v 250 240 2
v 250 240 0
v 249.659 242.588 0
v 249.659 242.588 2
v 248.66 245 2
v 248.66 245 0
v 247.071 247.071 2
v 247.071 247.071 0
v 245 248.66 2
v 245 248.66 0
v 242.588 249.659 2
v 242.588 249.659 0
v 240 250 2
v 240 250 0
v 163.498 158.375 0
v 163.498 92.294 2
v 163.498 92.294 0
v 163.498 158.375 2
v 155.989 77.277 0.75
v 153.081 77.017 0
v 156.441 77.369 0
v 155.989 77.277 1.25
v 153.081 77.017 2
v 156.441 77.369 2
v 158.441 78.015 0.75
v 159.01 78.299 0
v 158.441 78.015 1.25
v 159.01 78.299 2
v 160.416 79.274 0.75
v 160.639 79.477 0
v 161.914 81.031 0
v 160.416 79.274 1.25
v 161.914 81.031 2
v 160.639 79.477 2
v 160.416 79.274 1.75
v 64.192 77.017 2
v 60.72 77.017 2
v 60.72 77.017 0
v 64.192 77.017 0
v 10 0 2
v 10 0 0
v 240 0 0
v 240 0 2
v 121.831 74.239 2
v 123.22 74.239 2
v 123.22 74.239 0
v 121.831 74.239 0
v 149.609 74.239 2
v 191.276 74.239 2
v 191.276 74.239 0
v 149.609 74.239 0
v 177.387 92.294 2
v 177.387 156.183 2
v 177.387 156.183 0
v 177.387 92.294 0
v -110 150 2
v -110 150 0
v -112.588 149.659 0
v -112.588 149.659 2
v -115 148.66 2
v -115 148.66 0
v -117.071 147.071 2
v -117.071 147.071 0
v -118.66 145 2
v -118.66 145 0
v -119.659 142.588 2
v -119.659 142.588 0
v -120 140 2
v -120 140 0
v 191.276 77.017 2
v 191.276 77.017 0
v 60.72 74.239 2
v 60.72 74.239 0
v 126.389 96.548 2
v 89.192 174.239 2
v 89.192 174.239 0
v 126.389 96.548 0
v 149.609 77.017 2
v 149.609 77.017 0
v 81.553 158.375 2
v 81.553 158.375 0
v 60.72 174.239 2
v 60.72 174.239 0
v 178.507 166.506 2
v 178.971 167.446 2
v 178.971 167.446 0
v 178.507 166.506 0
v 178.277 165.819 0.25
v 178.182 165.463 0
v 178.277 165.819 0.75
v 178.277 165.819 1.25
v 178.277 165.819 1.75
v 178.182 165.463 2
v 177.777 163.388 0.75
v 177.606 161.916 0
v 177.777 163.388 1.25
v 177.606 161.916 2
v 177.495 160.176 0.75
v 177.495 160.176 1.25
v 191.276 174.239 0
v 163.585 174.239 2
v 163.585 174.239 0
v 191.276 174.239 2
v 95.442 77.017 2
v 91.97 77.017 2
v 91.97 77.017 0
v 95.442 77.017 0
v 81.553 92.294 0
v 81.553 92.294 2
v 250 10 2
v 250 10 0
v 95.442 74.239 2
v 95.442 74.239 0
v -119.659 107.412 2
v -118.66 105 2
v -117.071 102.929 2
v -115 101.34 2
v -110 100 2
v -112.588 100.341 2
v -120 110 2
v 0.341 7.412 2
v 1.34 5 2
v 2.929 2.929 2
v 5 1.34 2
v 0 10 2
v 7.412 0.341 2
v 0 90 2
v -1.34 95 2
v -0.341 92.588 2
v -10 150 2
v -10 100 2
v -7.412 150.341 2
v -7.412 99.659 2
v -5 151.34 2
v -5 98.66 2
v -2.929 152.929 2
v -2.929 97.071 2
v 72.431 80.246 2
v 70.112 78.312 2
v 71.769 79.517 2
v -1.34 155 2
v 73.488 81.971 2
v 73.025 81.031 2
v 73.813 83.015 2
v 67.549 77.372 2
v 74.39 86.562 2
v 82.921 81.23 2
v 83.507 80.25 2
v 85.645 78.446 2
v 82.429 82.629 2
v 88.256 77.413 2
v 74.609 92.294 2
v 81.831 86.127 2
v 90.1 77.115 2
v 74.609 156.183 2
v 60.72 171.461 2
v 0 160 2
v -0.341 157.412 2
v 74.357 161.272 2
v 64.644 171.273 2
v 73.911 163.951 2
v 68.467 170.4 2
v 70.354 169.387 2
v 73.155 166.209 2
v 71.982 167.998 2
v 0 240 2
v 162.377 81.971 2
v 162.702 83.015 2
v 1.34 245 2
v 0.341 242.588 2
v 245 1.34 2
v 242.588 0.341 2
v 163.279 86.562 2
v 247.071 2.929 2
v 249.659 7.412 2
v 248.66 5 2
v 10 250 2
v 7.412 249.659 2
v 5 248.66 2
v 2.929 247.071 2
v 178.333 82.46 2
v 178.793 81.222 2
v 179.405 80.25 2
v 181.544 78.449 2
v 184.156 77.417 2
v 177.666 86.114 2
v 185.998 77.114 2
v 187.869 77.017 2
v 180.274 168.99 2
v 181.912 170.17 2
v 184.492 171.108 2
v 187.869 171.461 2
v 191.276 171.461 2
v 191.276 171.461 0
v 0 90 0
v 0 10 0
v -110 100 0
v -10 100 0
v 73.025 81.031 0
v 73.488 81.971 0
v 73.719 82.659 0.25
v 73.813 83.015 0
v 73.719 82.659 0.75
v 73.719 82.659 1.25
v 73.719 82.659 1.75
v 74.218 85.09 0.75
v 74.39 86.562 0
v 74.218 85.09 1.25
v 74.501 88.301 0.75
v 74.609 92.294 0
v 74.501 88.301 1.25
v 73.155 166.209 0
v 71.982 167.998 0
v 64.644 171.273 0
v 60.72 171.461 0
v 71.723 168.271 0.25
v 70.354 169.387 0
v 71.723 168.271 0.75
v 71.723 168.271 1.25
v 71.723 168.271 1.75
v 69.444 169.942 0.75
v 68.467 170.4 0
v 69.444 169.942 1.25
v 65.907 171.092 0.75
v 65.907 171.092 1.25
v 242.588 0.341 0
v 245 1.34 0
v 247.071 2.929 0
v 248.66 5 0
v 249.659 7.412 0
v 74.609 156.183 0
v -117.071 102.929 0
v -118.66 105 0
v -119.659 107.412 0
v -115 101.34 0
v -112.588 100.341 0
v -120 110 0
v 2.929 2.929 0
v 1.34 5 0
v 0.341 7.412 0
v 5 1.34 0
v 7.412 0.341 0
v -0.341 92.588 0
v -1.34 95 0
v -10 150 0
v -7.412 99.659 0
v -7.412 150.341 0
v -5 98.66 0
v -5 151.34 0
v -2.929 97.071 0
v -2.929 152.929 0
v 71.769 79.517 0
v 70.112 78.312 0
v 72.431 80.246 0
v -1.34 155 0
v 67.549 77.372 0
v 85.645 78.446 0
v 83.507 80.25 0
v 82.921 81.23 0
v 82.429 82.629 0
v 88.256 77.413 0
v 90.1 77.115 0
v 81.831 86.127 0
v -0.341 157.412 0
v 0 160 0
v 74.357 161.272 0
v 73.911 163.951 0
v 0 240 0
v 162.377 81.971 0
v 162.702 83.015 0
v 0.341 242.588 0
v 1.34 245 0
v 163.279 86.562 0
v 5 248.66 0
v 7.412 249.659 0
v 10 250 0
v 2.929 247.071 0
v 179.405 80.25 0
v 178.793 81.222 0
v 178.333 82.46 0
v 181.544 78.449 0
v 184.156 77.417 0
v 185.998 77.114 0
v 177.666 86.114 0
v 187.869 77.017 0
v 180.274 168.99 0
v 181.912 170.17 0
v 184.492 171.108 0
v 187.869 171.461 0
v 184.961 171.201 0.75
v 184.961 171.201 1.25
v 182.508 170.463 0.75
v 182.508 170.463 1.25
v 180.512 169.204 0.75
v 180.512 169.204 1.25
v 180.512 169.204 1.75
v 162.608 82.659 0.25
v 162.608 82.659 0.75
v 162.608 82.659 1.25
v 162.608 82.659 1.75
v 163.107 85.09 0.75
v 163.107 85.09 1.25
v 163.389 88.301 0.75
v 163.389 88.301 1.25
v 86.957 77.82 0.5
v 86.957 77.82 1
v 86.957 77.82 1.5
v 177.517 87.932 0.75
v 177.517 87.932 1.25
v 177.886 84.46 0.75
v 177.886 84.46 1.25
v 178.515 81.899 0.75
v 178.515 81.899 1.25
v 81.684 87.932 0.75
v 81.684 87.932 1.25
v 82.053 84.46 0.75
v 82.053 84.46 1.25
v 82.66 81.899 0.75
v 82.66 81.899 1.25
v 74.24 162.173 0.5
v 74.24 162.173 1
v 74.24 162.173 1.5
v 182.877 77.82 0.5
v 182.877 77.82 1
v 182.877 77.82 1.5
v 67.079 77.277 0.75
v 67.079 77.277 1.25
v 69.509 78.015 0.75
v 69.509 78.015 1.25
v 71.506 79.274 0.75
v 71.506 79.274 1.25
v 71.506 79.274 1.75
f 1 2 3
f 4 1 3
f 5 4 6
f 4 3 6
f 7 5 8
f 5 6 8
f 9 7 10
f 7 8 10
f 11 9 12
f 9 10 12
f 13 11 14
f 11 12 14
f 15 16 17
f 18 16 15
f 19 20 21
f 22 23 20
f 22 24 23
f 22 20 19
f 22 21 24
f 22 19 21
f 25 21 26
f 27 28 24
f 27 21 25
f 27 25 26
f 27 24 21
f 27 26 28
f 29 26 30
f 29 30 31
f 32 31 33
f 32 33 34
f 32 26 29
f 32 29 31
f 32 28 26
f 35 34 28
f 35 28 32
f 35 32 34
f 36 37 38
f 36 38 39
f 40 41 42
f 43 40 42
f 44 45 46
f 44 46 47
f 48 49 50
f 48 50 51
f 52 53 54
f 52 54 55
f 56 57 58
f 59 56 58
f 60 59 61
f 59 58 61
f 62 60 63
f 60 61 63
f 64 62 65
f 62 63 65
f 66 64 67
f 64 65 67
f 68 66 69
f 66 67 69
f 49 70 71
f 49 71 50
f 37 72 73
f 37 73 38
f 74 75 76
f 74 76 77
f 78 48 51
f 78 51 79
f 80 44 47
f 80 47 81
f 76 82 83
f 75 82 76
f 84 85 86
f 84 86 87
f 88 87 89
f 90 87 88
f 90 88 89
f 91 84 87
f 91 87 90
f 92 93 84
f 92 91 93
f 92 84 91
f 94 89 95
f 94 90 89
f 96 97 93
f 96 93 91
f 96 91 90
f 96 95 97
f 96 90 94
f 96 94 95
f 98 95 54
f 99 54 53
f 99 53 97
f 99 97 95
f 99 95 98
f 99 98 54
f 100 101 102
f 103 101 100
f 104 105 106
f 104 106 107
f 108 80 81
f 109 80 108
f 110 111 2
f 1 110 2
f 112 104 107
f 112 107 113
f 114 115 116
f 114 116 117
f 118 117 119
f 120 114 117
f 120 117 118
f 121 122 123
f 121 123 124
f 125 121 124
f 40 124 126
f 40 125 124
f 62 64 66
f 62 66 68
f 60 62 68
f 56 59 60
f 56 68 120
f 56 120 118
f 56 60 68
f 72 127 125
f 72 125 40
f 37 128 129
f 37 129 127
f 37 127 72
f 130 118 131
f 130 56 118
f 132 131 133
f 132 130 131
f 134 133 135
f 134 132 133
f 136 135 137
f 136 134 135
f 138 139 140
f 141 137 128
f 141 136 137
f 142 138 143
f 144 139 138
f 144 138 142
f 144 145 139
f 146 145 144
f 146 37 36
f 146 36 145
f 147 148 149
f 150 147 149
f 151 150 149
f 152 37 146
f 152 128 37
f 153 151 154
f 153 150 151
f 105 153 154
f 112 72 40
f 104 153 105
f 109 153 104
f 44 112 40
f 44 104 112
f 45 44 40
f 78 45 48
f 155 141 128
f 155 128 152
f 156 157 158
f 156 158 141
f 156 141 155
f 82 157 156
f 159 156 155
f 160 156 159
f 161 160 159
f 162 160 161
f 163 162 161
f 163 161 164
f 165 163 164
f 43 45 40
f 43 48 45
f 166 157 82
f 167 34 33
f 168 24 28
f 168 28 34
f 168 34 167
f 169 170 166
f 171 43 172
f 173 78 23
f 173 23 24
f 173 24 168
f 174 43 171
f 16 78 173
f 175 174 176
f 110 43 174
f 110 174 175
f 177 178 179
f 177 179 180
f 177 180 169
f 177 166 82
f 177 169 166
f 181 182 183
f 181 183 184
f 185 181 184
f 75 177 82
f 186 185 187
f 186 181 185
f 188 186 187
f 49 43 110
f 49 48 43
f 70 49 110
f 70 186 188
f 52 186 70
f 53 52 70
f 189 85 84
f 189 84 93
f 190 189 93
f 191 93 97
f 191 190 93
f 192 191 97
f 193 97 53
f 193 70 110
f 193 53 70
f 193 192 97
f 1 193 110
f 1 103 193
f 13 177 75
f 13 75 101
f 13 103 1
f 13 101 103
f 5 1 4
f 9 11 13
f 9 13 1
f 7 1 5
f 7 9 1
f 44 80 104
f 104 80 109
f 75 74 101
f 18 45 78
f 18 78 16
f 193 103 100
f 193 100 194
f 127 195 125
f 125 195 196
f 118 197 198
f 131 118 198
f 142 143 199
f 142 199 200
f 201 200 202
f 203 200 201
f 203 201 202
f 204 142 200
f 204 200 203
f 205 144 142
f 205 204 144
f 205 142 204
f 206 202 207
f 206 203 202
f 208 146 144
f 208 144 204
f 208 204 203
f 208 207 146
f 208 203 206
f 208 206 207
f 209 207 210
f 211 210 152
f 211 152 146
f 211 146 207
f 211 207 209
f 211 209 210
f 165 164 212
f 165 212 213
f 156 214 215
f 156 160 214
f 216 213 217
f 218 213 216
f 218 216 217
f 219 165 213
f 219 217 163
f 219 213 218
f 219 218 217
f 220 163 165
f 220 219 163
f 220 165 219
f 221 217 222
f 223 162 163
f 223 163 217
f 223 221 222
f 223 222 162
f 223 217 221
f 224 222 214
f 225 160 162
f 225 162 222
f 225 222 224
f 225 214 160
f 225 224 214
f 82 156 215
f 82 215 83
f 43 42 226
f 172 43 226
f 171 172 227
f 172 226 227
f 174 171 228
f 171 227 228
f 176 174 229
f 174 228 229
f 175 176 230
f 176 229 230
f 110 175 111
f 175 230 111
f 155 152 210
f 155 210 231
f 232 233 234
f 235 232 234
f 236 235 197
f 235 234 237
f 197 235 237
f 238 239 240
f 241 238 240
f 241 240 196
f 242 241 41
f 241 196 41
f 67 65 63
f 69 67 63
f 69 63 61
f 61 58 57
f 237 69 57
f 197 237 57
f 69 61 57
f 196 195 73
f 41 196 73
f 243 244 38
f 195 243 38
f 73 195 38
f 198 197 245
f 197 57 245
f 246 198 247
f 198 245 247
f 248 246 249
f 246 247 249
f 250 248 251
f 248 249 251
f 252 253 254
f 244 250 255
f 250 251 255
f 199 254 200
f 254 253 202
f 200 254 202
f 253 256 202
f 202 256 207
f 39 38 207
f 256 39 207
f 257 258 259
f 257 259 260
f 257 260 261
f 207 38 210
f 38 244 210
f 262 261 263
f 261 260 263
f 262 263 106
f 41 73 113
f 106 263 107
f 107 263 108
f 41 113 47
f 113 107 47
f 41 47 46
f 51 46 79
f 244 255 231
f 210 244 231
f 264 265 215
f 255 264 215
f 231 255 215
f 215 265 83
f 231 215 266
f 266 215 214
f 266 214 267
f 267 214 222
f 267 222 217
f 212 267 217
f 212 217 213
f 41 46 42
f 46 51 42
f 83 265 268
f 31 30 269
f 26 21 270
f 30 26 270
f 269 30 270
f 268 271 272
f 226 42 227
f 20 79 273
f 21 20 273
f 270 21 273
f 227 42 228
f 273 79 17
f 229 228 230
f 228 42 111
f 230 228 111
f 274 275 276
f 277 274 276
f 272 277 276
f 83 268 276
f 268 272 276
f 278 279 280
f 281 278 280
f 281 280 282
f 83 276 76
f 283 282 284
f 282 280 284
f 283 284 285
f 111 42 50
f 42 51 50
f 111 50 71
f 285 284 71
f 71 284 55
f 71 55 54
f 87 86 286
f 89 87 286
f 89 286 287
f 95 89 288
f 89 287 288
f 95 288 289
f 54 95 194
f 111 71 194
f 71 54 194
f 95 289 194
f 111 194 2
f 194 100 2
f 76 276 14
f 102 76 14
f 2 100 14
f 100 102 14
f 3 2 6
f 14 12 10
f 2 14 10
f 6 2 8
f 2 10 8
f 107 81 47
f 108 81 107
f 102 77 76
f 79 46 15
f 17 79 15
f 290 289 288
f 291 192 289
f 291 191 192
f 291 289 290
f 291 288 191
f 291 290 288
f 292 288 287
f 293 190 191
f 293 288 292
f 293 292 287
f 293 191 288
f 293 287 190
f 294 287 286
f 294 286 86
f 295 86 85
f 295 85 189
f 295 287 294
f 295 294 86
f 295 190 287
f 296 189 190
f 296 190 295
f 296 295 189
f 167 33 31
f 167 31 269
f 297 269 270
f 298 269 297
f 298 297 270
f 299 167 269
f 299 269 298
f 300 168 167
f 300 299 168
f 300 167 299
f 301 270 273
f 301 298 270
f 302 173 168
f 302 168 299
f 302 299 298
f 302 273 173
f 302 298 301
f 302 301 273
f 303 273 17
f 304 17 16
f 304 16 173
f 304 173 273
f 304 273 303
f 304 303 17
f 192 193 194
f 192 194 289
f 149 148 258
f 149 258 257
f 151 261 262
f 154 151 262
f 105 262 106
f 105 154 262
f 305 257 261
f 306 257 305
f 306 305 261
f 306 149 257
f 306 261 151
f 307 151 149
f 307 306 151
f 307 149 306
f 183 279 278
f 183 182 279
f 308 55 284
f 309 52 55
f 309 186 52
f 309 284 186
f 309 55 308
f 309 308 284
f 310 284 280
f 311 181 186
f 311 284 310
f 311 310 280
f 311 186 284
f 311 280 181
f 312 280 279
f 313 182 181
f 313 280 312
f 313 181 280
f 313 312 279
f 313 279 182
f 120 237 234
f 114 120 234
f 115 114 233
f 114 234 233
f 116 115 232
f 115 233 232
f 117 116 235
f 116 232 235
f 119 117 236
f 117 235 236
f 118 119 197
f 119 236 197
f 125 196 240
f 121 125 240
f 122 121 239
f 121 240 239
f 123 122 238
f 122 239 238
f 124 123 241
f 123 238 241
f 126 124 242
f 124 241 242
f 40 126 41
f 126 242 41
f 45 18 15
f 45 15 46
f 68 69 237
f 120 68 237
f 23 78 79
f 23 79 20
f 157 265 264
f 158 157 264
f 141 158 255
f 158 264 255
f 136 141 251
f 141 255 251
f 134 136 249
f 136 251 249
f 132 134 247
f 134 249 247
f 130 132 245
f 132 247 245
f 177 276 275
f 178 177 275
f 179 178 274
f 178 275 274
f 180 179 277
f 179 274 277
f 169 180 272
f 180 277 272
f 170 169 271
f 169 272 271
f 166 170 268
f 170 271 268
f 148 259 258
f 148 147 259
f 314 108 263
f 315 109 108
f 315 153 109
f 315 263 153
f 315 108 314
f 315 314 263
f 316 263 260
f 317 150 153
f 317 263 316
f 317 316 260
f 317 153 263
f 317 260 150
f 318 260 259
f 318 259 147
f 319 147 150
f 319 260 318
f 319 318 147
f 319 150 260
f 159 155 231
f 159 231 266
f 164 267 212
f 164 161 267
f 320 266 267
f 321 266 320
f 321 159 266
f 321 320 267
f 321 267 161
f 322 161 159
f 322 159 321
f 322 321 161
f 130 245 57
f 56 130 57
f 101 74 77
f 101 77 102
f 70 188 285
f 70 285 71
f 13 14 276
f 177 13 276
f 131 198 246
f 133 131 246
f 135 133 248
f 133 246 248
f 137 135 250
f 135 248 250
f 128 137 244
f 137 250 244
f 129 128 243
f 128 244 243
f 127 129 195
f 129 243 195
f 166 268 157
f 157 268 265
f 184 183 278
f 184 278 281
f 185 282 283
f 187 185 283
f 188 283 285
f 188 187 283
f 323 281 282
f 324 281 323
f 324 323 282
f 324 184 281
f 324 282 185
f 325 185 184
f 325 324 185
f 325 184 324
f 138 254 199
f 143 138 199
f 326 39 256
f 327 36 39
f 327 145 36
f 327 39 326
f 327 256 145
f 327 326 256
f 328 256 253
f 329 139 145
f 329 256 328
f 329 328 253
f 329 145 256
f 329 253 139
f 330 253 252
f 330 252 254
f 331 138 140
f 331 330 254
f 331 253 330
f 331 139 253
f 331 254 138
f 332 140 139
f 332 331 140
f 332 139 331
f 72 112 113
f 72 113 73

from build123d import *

# Parameters (mm, degrees)
BOSS_EXTRUDE1_DEPTH = 2
CUT_EXTRUDE1_DEPTH  = 2


with BuildPart() as part:
    # Sketch1 → Boss-Extrude1 (new body)
    with BuildSketch(Plane.XY):
        with BuildLine():
            Line((10, 0), (240, 0))
            ThreePointArc((240, 0), (247.071067812, 2.928932188), (250, 10))
            Line((250, 10), (250, 240))
            ThreePointArc((250, 240), (247.071067812, 247.071067812), (240, 250))
            Line((240, 250), (10, 250))
            ThreePointArc((10, 250), (2.928932188, 247.071067812), (0, 240))
            Line((0, 240), (0, 160))
            ThreePointArc((0, 160), (-2.928932188, 152.928932188), (-10, 150))
            Line((-10, 150), (-110, 150))
            ThreePointArc((-110, 150), (-117.071067812, 147.071067812), (-120, 140))
            Line((-120, 140), (-120, 110))
            ThreePointArc((-120, 110), (-117.071067812, 102.928932188), (-110, 100))
            Line((-110, 100), (-10, 100))
            ThreePointArc((-10, 100), (-2.928932188, 97.071067812), (0, 90))
            Line((0, 90), (0, 10))
            ThreePointArc((0, 10), (2.928932188, 2.928932188), (10, 0))
        make_face()
    extrude(amount=BOSS_EXTRUDE1_DEPTH)

    # Sketch2 → Cut-Extrude1 (cut)
    with BuildSketch(Plane.XY.offset(2)):
        with BuildLine():
            Line((121.831245853, 74.238883319), (81.553468075, 158.375168042))
            Line((81.553468075, 158.375168042), (81.553468075, 92.294438875))
            add(Edge.make_bspline(
                [(81.553468075, 92.294438875), (81.552441695, 91.527408259), (81.550494213, 90.07202371), (81.67476659, 88.003330285), (81.809557178, 86.154926562), (82.033410561, 84.535090304), (82.270961447, 83.126350994), (82.624899995, 81.963045824), (82.992758599, 80.996359886), (83.345604613, 80.48395593), (83.506593075, 80.250168042)],
                knots=[0, 0, 0, 0, 1.48973486, 2.826663046, 4.025252461, 5.088590954, 6.003687083, 6.795186099, 7.45029523, 8, 8, 8, 8], degree=3))
            add(Edge.make_bspline(
                [(83.506593075, 80.250168042), (83.997407371, 79.750770196), (84.996905643, 78.733792313), (87.003759394, 77.711270113), (89.366130367, 77.105906039), (91.068976257, 77.047545775), (91.970134742, 77.016661097)],
                knots=[0, 0, 0, 0, 0.893460505, 1.819450328, 2.846037184, 4, 4, 4, 4], degree=3))
            Line((91.970134742, 77.016661097), (95.442356964, 77.016661097))
            Line((95.442356964, 77.016661097), (95.442356964, 74.238883319))
            Line((95.442356964, 74.238883319), (60.720134742, 74.238883319))
            Line((60.720134742, 74.238883319), (60.720134742, 77.016661097))
            Line((60.720134742, 77.016661097), (64.192356964, 77.016661097))
            add(Edge.make_bspline(
                [(64.192356964, 77.016661097), (64.692336968, 77.027575423), (65.660187495, 77.048703141), (67.053155801, 77.255679207), (68.340072371, 77.542980734), (69.511077493, 77.990029314), (70.577284489, 78.54537262), (71.523997685, 79.246760067), (72.334604766, 80.088398233), (72.793088669, 80.714808629), (73.024822242, 81.031418042)],
                knots=[0, 0, 0, 0, 1.182386838, 2.288838982, 3.326958154, 4.296765023, 5.246416275, 6.164047556, 7.072046332, 8, 8, 8, 8], degree=3))
            add(Edge.make_bspline(
                [(73.024822242, 81.031418042), (73.154175481, 81.267158908), (73.438935547, 81.786122213), (73.754068555, 82.7087764), (73.999815936, 83.832477906), (74.243351558, 85.140425739), (74.413930293, 86.655788373), (74.502709761, 88.358707772), (74.607417007, 90.260571867), (74.608469203, 91.592574666), (74.609023631, 92.294438875)],
                knots=[0, 0, 0, 0, 0.561580455, 1.236271222, 2.028879402, 2.966584022, 4.017422664, 5.2149421, 6.532486222, 8, 8, 8, 8], degree=3))
            Line((74.609023631, 92.294438875), (74.609023631, 156.183327764))
            add(Edge.make_bspline(
                [(74.609023631, 156.183327764), (74.598097419, 157.262279808), (74.57781297, 159.265348068), (74.292147678, 162.020464101), (73.887395445, 164.316152629), (73.38248359, 165.621386735), (73.155030575, 166.20936943)],
                knots=[0, 0, 0, 0, 1.269100049, 2.356076937, 3.259444487, 4, 4, 4, 4], degree=3))
            add(Edge.make_bspline(
                [(73.155030575, 166.20936943), (72.964440038, 166.571330676), (72.572351095, 167.315968917), (71.739346077, 168.310495354), (70.678433406, 169.192456789), (69.404596857, 170.014029453), (67.793926343, 170.70426646), (65.790057774, 171.151821363), (63.389943364, 171.426827209), (61.654210729, 171.449112709), (60.720134742, 171.461105542)],
                knots=[0, 0, 0, 0, 0.685675889, 1.410594349, 2.160436148, 2.996293973, 3.94870651, 5.086176952, 6.431940446, 8, 8, 8, 8], degree=3))
            Line((60.720134742, 171.461105542), (60.720134742, 174.238883319))
            Line((60.720134742, 174.238883319), (89.192356964, 174.238883319))
            Line((89.192356964, 174.238883319), (126.38853752, 96.547911097))
            Line((126.38853752, 96.547911097), (163.584718075, 174.238883319))
            Line((163.584718075, 174.238883319), (191.275690297, 174.238883319))
            Line((191.275690297, 174.238883319), (191.275690297, 171.461105542))
            Line((191.275690297, 171.461105542), (187.868572242, 171.461105542))
            add(Edge.make_bspline(
                [(187.868572242, 171.461105542), (187.361287545, 171.450707073), (186.386065744, 171.430716694), (184.979607429, 171.218940655), (183.683652592, 170.938748781), (182.506844601, 170.48708074), (181.439074078, 169.933617837), (180.493564629, 169.223853404), (179.660586682, 168.397082941), (179.201520738, 167.764165368), (178.971002797, 167.446348597)],
                knots=[0, 0, 0, 0, 1.192663738, 2.292818382, 3.341598875, 4.305885976, 5.250132179, 6.162540657, 7.077327887, 8, 8, 8, 8], degree=3))
            add(Edge.make_bspline(
                [(178.971002797, 167.446348597), (178.841649558, 167.210607731), (178.556889492, 166.691644426), (178.241756484, 165.768990238), (177.996009103, 164.645288733), (177.752473481, 163.3373409), (177.581894746, 161.821978266), (177.493115279, 160.119058867), (177.388408032, 158.217194771), (177.387355836, 156.885191972), (177.386801408, 156.183327764)],
                knots=[0, 0, 0, 0, 0.561580455, 1.236271222, 2.028879402, 2.966584022, 4.017422664, 5.2149421, 6.532486222, 8, 8, 8, 8], degree=3))
            Line((177.386801408, 156.183327764), (177.386801408, 92.294438875))
            add(Edge.make_bspline(
                [(177.386801408, 92.294438875), (177.385877428, 91.527429602), (177.384124243, 90.072085551), (177.507098339, 88.003121526), (177.646069278, 86.155589108), (177.85710522, 84.531668283), (178.13424254, 83.12975452), (178.473014721, 81.957654643), (178.8699969, 80.994203331), (179.237061444, 80.483751398), (179.405030575, 80.250168042)],
                knots=[0, 0, 0, 0, 1.486776415, 2.821049613, 4.017258766, 5.078485589, 5.994452933, 6.784380121, 7.443731031, 8, 8, 8, 8], degree=3))
            add(Edge.make_bspline(
                [(179.405030575, 80.250168042), (179.895423699, 79.749880201), (180.898563608, 78.726499826), (182.913754693, 77.721375862), (185.270314869, 77.101877529), (186.966975459, 77.046231247), (187.868572242, 77.016661097)],
                knots=[0, 0, 0, 0, 0.893634595, 1.828003868, 2.845812335, 4, 4, 4, 4], degree=3))
            Line((187.868572242, 77.016661097), (191.275690297, 77.016661097))
            Line((191.275690297, 77.016661097), (191.275690297, 74.238883319))
            Line((191.275690297, 74.238883319), (149.609023631, 74.238883319))
            Line((149.609023631, 74.238883319), (149.609023631, 77.016661097))
            Line((149.609023631, 77.016661097), (153.081245853, 77.016661097))
            add(Edge.make_bspline(
                [(153.081245853, 77.016661097), (153.588433734, 77.027378344), (154.563469412, 77.047981553), (155.964240322, 77.254470656), (157.255601407, 77.548600741), (158.43409031, 77.978736677), (159.491525168, 78.55248399), (160.434038314, 79.246610187), (161.24579725, 80.082629427), (161.690291414, 80.714044665), (161.913711131, 81.031418042)],
                knots=[0, 0, 0, 0, 1.198333024, 2.303717216, 3.340834392, 4.325725627, 5.259386468, 6.176132048, 7.08325442, 8, 8, 8, 8], degree=3))
            add(Edge.make_bspline(
                [(161.913711131, 81.031418042), (162.04306437, 81.267158908), (162.327824436, 81.786122213), (162.642957444, 82.7087764), (162.888704825, 83.832477906), (163.132240447, 85.140425739), (163.302819182, 86.655788373), (163.391598649, 88.358707772), (163.496305896, 90.260571867), (163.497358092, 91.592574666), (163.49791252, 92.294438875)],
                knots=[0, 0, 0, 0, 0.561580455, 1.236271222, 2.028879402, 2.966584022, 4.017422664, 5.2149421, 6.532486222, 8, 8, 8, 8], degree=3))
            Line((163.49791252, 92.294438875), (163.49791252, 158.375168042))
            Line((163.49791252, 158.375168042), (123.220134742, 74.238883319))
            Line((123.220134742, 74.238883319), (121.831245853, 74.238883319))
        make_face()
    extrude(amount=-CUT_EXTRUDE1_DEPTH, mode=Mode.SUBTRACT)


solid = part.part
